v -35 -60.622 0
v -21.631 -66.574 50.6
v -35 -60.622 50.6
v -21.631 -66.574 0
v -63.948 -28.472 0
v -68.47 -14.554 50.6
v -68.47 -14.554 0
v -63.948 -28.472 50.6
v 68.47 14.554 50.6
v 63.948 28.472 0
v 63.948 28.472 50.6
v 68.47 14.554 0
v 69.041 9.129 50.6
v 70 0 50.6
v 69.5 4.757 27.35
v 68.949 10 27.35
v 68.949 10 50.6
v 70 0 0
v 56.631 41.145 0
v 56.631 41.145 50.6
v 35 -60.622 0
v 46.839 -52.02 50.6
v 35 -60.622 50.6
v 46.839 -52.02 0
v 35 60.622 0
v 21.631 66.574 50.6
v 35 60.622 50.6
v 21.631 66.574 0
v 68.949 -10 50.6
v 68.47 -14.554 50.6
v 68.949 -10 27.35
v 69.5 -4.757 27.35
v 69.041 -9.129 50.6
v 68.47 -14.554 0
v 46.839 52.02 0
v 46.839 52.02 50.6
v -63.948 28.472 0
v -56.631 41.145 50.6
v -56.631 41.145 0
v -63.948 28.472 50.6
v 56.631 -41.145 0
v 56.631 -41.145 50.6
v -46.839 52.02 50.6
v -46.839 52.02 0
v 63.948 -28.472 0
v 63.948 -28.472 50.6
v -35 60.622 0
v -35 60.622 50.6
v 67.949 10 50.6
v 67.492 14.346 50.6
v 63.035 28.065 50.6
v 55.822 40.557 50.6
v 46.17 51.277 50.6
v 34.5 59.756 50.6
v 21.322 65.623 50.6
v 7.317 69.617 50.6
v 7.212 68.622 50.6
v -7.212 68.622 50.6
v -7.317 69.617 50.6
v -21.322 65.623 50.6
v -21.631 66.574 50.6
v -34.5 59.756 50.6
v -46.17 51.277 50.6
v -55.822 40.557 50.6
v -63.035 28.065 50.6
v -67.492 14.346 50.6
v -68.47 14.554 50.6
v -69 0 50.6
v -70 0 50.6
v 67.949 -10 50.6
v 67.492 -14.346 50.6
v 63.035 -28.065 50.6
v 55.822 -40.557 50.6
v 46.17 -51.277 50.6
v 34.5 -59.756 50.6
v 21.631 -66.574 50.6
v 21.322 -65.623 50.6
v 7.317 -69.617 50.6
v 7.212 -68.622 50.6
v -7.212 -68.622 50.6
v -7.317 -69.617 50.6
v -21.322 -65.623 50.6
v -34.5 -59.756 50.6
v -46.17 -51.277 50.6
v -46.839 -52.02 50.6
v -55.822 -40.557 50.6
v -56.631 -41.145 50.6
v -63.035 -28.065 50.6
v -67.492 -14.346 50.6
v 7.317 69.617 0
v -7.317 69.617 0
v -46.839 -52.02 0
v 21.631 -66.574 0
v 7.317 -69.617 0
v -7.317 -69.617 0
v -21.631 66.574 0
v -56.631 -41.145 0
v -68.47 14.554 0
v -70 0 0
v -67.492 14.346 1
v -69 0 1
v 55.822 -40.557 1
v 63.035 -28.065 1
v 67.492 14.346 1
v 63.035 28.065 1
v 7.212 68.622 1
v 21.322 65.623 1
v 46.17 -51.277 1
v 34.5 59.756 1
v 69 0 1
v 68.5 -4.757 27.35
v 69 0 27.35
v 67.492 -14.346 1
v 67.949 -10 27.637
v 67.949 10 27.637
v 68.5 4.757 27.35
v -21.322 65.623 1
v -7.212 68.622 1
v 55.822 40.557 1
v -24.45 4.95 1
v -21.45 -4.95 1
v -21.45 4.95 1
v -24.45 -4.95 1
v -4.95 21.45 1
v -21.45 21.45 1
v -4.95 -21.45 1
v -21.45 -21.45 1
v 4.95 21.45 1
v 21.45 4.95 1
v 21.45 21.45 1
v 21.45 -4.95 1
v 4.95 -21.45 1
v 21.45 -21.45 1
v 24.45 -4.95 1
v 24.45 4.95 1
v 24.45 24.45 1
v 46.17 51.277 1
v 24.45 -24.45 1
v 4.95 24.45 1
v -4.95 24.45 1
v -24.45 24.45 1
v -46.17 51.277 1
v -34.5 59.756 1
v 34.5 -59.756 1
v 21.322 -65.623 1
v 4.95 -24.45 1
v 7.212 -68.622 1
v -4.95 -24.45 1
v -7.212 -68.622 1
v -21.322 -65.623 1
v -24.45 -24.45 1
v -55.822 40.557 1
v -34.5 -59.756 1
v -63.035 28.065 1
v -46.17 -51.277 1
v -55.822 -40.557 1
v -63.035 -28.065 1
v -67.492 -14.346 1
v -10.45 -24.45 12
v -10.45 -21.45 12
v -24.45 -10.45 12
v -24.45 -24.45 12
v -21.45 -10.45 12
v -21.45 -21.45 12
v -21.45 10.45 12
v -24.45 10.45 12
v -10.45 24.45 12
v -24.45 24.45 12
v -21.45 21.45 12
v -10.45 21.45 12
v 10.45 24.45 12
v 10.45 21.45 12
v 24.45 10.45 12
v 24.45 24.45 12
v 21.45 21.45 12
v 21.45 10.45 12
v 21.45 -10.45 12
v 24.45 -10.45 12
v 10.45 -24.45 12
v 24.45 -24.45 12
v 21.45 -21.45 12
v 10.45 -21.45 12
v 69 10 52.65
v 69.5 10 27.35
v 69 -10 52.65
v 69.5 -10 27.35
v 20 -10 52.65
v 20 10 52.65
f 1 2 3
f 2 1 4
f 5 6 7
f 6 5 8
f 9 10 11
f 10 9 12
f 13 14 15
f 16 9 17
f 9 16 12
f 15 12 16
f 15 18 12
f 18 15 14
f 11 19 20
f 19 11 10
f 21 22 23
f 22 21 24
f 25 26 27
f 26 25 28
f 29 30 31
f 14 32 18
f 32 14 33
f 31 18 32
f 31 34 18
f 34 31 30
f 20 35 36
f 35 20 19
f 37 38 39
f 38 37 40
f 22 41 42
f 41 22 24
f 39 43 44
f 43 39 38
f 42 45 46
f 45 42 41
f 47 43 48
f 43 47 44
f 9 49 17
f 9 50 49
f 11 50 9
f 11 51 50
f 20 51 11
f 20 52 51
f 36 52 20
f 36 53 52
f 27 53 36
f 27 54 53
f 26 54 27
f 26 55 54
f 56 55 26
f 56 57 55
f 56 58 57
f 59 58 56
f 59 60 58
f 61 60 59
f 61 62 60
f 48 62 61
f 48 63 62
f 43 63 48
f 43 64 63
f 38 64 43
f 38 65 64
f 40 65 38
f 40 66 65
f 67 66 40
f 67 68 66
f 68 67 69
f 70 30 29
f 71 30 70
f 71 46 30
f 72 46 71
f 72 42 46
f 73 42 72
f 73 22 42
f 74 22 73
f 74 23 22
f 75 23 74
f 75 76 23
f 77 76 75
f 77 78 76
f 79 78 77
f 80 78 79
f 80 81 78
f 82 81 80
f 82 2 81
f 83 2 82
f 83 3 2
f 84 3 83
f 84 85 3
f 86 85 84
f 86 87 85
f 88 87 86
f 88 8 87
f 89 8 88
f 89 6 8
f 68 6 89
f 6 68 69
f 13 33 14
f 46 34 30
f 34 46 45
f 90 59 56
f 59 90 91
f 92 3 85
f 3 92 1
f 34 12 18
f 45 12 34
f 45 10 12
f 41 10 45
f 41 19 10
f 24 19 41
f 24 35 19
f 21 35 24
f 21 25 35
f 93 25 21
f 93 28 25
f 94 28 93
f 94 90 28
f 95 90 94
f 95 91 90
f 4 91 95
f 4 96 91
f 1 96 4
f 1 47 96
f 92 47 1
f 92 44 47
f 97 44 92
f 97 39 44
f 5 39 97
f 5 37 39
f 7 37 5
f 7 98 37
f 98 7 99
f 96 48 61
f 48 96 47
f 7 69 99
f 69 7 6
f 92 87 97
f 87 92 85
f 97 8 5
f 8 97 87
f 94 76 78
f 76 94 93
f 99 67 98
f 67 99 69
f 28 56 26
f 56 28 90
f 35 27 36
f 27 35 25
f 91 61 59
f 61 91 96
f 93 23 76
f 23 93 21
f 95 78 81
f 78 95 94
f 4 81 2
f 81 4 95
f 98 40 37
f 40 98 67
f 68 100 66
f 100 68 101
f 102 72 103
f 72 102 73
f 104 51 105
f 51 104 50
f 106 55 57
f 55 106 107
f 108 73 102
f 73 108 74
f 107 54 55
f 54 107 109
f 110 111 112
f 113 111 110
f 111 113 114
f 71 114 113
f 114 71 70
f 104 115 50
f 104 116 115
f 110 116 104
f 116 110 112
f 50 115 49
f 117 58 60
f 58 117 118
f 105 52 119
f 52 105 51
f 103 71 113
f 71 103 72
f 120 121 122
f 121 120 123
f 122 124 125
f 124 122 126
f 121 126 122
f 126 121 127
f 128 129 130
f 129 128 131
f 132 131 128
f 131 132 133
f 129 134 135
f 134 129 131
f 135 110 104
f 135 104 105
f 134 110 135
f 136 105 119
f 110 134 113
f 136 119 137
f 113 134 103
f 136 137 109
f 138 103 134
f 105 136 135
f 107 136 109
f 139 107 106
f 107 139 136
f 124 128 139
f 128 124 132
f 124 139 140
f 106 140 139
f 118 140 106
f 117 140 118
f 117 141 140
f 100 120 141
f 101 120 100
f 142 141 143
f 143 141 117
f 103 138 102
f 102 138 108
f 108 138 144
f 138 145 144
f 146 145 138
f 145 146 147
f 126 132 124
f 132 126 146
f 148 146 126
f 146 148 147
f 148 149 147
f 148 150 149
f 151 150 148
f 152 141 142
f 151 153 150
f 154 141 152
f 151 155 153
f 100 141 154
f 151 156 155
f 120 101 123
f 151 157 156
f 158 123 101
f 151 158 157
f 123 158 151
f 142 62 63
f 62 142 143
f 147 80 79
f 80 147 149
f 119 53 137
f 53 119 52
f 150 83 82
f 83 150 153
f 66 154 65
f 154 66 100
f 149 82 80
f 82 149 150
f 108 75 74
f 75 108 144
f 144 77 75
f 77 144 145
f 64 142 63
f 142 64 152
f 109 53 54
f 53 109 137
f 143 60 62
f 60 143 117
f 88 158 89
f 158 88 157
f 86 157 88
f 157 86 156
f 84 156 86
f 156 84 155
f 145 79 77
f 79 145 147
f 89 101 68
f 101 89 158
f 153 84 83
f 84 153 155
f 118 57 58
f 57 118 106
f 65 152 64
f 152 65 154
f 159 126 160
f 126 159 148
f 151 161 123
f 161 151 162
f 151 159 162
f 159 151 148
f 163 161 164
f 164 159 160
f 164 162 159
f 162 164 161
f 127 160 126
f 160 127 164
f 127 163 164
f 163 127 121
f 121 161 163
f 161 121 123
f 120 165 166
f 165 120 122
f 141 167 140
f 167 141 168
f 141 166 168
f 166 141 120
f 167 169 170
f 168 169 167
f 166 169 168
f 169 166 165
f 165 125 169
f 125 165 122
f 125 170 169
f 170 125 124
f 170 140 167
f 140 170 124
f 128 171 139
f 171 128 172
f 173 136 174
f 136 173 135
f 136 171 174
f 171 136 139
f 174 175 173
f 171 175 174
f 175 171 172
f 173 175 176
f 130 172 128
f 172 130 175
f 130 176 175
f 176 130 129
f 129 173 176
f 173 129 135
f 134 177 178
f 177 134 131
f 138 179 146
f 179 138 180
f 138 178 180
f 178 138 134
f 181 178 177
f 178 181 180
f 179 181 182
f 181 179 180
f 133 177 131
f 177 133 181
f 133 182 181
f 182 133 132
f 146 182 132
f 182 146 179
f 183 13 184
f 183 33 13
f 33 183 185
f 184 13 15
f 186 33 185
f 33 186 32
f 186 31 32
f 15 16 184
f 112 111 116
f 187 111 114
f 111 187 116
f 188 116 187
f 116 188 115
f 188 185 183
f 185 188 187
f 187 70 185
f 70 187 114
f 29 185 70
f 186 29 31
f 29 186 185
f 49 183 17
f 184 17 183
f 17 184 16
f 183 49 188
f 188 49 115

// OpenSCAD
// file: ../utils/motor.scad
// for local tests only
//motor();

// measured dimensions
motor_total_length=71.35;
motor_block_length=47.3;
motor_block_side=42.3;
motor_block_flat_diameter=53.6;
motor_block_and_disk_length=49;
motor_disk_diameter=22;
motor_disk_length=motor_block_and_disk_length - motor_block_length;
motor_axis_length=motor_total_length - motor_block_and_disk_length;
motor_axis_diameter=5;
motor_axis_diameter_flat=4.5;
motor_axis_radius=motor_axis_diameter / 2;
motor_axis_radius_flat=motor_axis_diameter_flat - motor_axis_radius;

module motor(axis_angle=90) {
    rotate([0,axis_angle,0])
    motor_axis();
    motor_block();
}

module motor_axis(radiusPadding=0, with_flat_section=true) {
    difference() {
        rotate([90,0,0])
        cylinder(motor_axis_length,r=motor_axis_radius+radiusPadding,center=false,$fn=100);
        
        if (with_flat_section) {
            translate([-5,-motor_axis_length-1,motor_axis_radius_flat])
            cube([10,motor_axis_length+2,10],center=false);
        }
    }
}

module motor_block() {
    rotate([90,0,0])
    translate([0,0,-motor_disk_length])
    cylinder(motor_disk_length,r=motor_disk_diameter/2,center=false,$fn=30);
        
    difference() {
        rotate([90,0,0])
        translate([-motor_block_side/2,-motor_block_side/2,-motor_block_length-motor_disk_length])
        cube([motor_block_side,motor_block_side,motor_block_length],center=false);
        
        for(i=[0:1:3]) {
            rotate([0,45+90*i,0])
            translate([0,0,motor_block_flat_diameter/2])
            motor_block_edge_cutter();
        }
    }
}

module motor_block_edge_cutter() {
    rotate([90,0,0])
    translate([-motor_block_side/2,0,-motor_block_length-motor_disk_length-1])
    cube([motor_block_side,10,motor_block_length+2],center=false);
}
// file: ../utils/utils.scad
module trapezoid(len1, len2, h, thickness, top_offset_x = 0) {
    linear_extrude(height=thickness, center=true, scale = 1.0, $fn = 16) {
        polygon(points = [
            [-len1/2, -h/2],
            [len1/2, -h/2],
            [len2/2 + top_offset_x, h/2],
            [-len2/2 + top_offset_x, h/2],
        ]);
    }
}



module cut(vec=[1,0,0]){
    cube_size = 300;
    difference(){
        for(i=[0:$children-1]) {children();}
        
        base_offset = [sign(vec[0])*cube_size/2,sign(vec[1])*cube_size/2,sign(vec[2])*cube_size/2];
        
        color("#ff0000")
        translate(base_offset + vec)
        cube(cube_size,true);
    }
}

module rect_rounded(width, height, thickness, rounding_radius) {
    w = width/2 - rounding_radius;
    h = height/2 - rounding_radius;
    hull() {
        translate([-w, -h, 0])
        cylinder(thickness, r=rounding_radius, center=false, $fn=48);
        
        translate([w, -h, 0])
        cylinder(thickness, r=rounding_radius, center=false, $fn=48);
        
        translate([-w, h, 0])
        cylinder(thickness, r=rounding_radius, center=false, $fn=48);
        
        translate([w, h, 0])
        cylinder(thickness, r=rounding_radius, center=false, $fn=48);
    }
}
// file: params.scad
include <../utils/motor.scad>

thickness=1;
clearance=0.3;

reservoirR=70;
reservoirH=150;

carouselH=10;
carouselHoleAngle=25;

bottomH = motor_block_and_disk_length + thickness + clearance * 2;
// main file
include <params.scad>
include <../utils/utils.scad>

include <../utils/motor.scad>

// for tests
//cut([0,1,0])
bottom();

%translate([0, 0, motor_block_and_disk_length + thickness])
rotate([-90, 0, 0])
motor();



module bottom() {
    difference() {
        body(reservoirR, bottomH);


    }

    w = reservoirR * 0.7;
    translate([reservoirR * 1 - 1, 0, 40])
    rotate([90, 0, 0])
    trapezoid(1, w, bottomH/2, 20, -reservoirR * 0.35);

    //difference() {
    //    h = 40;
    //    translate([reservoirR*0.2, h/2, h+10])
    //    rotate([90, 30, 0])
    //    cube([reservoirR, h, h]);
    //    
    //    translate([-100+30, -reservoirR/2, 0])
    //    cube(100);
    //    
    //    translate([0, 0, 250+bottomH])
    //    cube([500, 500, 500], center=true);
    //}

    motor_holders();
}


module body(radius, height) {
    difference() {
        cylinder(bottomH, r=reservoirR, center=false);
        
        translate([0, 0, thickness])
        cylinder(bottomH, r=reservoirR - thickness, center=false);
    }
}

module motor_holders() {
    h = 12;
    w = 20;
    thickness = 3;
    
    holder_offset = -motor_block_side/2 - thickness/2 - clearance;
    for(i=[0:1:3]) {
        rotate([0, 0, -90 * i])
        translate([holder_offset, holder_offset, 0])
        rotate([0, 0, -90])
        motor_holder(h, w, thickness);
    }
}

module motor_holder(h, w, thickness) {
    half_holder(h, w, thickness);
    
    rotate([0,0,90])
    half_holder(h, w, thickness);
}

module half_holder(h, w, thickness) {
    translate([0, w/2 - thickness/2, h/2])
    rotate([90,0,90])
    trapezoid(w, w * 0.7, h, thickness, -w * 0.15);
}
